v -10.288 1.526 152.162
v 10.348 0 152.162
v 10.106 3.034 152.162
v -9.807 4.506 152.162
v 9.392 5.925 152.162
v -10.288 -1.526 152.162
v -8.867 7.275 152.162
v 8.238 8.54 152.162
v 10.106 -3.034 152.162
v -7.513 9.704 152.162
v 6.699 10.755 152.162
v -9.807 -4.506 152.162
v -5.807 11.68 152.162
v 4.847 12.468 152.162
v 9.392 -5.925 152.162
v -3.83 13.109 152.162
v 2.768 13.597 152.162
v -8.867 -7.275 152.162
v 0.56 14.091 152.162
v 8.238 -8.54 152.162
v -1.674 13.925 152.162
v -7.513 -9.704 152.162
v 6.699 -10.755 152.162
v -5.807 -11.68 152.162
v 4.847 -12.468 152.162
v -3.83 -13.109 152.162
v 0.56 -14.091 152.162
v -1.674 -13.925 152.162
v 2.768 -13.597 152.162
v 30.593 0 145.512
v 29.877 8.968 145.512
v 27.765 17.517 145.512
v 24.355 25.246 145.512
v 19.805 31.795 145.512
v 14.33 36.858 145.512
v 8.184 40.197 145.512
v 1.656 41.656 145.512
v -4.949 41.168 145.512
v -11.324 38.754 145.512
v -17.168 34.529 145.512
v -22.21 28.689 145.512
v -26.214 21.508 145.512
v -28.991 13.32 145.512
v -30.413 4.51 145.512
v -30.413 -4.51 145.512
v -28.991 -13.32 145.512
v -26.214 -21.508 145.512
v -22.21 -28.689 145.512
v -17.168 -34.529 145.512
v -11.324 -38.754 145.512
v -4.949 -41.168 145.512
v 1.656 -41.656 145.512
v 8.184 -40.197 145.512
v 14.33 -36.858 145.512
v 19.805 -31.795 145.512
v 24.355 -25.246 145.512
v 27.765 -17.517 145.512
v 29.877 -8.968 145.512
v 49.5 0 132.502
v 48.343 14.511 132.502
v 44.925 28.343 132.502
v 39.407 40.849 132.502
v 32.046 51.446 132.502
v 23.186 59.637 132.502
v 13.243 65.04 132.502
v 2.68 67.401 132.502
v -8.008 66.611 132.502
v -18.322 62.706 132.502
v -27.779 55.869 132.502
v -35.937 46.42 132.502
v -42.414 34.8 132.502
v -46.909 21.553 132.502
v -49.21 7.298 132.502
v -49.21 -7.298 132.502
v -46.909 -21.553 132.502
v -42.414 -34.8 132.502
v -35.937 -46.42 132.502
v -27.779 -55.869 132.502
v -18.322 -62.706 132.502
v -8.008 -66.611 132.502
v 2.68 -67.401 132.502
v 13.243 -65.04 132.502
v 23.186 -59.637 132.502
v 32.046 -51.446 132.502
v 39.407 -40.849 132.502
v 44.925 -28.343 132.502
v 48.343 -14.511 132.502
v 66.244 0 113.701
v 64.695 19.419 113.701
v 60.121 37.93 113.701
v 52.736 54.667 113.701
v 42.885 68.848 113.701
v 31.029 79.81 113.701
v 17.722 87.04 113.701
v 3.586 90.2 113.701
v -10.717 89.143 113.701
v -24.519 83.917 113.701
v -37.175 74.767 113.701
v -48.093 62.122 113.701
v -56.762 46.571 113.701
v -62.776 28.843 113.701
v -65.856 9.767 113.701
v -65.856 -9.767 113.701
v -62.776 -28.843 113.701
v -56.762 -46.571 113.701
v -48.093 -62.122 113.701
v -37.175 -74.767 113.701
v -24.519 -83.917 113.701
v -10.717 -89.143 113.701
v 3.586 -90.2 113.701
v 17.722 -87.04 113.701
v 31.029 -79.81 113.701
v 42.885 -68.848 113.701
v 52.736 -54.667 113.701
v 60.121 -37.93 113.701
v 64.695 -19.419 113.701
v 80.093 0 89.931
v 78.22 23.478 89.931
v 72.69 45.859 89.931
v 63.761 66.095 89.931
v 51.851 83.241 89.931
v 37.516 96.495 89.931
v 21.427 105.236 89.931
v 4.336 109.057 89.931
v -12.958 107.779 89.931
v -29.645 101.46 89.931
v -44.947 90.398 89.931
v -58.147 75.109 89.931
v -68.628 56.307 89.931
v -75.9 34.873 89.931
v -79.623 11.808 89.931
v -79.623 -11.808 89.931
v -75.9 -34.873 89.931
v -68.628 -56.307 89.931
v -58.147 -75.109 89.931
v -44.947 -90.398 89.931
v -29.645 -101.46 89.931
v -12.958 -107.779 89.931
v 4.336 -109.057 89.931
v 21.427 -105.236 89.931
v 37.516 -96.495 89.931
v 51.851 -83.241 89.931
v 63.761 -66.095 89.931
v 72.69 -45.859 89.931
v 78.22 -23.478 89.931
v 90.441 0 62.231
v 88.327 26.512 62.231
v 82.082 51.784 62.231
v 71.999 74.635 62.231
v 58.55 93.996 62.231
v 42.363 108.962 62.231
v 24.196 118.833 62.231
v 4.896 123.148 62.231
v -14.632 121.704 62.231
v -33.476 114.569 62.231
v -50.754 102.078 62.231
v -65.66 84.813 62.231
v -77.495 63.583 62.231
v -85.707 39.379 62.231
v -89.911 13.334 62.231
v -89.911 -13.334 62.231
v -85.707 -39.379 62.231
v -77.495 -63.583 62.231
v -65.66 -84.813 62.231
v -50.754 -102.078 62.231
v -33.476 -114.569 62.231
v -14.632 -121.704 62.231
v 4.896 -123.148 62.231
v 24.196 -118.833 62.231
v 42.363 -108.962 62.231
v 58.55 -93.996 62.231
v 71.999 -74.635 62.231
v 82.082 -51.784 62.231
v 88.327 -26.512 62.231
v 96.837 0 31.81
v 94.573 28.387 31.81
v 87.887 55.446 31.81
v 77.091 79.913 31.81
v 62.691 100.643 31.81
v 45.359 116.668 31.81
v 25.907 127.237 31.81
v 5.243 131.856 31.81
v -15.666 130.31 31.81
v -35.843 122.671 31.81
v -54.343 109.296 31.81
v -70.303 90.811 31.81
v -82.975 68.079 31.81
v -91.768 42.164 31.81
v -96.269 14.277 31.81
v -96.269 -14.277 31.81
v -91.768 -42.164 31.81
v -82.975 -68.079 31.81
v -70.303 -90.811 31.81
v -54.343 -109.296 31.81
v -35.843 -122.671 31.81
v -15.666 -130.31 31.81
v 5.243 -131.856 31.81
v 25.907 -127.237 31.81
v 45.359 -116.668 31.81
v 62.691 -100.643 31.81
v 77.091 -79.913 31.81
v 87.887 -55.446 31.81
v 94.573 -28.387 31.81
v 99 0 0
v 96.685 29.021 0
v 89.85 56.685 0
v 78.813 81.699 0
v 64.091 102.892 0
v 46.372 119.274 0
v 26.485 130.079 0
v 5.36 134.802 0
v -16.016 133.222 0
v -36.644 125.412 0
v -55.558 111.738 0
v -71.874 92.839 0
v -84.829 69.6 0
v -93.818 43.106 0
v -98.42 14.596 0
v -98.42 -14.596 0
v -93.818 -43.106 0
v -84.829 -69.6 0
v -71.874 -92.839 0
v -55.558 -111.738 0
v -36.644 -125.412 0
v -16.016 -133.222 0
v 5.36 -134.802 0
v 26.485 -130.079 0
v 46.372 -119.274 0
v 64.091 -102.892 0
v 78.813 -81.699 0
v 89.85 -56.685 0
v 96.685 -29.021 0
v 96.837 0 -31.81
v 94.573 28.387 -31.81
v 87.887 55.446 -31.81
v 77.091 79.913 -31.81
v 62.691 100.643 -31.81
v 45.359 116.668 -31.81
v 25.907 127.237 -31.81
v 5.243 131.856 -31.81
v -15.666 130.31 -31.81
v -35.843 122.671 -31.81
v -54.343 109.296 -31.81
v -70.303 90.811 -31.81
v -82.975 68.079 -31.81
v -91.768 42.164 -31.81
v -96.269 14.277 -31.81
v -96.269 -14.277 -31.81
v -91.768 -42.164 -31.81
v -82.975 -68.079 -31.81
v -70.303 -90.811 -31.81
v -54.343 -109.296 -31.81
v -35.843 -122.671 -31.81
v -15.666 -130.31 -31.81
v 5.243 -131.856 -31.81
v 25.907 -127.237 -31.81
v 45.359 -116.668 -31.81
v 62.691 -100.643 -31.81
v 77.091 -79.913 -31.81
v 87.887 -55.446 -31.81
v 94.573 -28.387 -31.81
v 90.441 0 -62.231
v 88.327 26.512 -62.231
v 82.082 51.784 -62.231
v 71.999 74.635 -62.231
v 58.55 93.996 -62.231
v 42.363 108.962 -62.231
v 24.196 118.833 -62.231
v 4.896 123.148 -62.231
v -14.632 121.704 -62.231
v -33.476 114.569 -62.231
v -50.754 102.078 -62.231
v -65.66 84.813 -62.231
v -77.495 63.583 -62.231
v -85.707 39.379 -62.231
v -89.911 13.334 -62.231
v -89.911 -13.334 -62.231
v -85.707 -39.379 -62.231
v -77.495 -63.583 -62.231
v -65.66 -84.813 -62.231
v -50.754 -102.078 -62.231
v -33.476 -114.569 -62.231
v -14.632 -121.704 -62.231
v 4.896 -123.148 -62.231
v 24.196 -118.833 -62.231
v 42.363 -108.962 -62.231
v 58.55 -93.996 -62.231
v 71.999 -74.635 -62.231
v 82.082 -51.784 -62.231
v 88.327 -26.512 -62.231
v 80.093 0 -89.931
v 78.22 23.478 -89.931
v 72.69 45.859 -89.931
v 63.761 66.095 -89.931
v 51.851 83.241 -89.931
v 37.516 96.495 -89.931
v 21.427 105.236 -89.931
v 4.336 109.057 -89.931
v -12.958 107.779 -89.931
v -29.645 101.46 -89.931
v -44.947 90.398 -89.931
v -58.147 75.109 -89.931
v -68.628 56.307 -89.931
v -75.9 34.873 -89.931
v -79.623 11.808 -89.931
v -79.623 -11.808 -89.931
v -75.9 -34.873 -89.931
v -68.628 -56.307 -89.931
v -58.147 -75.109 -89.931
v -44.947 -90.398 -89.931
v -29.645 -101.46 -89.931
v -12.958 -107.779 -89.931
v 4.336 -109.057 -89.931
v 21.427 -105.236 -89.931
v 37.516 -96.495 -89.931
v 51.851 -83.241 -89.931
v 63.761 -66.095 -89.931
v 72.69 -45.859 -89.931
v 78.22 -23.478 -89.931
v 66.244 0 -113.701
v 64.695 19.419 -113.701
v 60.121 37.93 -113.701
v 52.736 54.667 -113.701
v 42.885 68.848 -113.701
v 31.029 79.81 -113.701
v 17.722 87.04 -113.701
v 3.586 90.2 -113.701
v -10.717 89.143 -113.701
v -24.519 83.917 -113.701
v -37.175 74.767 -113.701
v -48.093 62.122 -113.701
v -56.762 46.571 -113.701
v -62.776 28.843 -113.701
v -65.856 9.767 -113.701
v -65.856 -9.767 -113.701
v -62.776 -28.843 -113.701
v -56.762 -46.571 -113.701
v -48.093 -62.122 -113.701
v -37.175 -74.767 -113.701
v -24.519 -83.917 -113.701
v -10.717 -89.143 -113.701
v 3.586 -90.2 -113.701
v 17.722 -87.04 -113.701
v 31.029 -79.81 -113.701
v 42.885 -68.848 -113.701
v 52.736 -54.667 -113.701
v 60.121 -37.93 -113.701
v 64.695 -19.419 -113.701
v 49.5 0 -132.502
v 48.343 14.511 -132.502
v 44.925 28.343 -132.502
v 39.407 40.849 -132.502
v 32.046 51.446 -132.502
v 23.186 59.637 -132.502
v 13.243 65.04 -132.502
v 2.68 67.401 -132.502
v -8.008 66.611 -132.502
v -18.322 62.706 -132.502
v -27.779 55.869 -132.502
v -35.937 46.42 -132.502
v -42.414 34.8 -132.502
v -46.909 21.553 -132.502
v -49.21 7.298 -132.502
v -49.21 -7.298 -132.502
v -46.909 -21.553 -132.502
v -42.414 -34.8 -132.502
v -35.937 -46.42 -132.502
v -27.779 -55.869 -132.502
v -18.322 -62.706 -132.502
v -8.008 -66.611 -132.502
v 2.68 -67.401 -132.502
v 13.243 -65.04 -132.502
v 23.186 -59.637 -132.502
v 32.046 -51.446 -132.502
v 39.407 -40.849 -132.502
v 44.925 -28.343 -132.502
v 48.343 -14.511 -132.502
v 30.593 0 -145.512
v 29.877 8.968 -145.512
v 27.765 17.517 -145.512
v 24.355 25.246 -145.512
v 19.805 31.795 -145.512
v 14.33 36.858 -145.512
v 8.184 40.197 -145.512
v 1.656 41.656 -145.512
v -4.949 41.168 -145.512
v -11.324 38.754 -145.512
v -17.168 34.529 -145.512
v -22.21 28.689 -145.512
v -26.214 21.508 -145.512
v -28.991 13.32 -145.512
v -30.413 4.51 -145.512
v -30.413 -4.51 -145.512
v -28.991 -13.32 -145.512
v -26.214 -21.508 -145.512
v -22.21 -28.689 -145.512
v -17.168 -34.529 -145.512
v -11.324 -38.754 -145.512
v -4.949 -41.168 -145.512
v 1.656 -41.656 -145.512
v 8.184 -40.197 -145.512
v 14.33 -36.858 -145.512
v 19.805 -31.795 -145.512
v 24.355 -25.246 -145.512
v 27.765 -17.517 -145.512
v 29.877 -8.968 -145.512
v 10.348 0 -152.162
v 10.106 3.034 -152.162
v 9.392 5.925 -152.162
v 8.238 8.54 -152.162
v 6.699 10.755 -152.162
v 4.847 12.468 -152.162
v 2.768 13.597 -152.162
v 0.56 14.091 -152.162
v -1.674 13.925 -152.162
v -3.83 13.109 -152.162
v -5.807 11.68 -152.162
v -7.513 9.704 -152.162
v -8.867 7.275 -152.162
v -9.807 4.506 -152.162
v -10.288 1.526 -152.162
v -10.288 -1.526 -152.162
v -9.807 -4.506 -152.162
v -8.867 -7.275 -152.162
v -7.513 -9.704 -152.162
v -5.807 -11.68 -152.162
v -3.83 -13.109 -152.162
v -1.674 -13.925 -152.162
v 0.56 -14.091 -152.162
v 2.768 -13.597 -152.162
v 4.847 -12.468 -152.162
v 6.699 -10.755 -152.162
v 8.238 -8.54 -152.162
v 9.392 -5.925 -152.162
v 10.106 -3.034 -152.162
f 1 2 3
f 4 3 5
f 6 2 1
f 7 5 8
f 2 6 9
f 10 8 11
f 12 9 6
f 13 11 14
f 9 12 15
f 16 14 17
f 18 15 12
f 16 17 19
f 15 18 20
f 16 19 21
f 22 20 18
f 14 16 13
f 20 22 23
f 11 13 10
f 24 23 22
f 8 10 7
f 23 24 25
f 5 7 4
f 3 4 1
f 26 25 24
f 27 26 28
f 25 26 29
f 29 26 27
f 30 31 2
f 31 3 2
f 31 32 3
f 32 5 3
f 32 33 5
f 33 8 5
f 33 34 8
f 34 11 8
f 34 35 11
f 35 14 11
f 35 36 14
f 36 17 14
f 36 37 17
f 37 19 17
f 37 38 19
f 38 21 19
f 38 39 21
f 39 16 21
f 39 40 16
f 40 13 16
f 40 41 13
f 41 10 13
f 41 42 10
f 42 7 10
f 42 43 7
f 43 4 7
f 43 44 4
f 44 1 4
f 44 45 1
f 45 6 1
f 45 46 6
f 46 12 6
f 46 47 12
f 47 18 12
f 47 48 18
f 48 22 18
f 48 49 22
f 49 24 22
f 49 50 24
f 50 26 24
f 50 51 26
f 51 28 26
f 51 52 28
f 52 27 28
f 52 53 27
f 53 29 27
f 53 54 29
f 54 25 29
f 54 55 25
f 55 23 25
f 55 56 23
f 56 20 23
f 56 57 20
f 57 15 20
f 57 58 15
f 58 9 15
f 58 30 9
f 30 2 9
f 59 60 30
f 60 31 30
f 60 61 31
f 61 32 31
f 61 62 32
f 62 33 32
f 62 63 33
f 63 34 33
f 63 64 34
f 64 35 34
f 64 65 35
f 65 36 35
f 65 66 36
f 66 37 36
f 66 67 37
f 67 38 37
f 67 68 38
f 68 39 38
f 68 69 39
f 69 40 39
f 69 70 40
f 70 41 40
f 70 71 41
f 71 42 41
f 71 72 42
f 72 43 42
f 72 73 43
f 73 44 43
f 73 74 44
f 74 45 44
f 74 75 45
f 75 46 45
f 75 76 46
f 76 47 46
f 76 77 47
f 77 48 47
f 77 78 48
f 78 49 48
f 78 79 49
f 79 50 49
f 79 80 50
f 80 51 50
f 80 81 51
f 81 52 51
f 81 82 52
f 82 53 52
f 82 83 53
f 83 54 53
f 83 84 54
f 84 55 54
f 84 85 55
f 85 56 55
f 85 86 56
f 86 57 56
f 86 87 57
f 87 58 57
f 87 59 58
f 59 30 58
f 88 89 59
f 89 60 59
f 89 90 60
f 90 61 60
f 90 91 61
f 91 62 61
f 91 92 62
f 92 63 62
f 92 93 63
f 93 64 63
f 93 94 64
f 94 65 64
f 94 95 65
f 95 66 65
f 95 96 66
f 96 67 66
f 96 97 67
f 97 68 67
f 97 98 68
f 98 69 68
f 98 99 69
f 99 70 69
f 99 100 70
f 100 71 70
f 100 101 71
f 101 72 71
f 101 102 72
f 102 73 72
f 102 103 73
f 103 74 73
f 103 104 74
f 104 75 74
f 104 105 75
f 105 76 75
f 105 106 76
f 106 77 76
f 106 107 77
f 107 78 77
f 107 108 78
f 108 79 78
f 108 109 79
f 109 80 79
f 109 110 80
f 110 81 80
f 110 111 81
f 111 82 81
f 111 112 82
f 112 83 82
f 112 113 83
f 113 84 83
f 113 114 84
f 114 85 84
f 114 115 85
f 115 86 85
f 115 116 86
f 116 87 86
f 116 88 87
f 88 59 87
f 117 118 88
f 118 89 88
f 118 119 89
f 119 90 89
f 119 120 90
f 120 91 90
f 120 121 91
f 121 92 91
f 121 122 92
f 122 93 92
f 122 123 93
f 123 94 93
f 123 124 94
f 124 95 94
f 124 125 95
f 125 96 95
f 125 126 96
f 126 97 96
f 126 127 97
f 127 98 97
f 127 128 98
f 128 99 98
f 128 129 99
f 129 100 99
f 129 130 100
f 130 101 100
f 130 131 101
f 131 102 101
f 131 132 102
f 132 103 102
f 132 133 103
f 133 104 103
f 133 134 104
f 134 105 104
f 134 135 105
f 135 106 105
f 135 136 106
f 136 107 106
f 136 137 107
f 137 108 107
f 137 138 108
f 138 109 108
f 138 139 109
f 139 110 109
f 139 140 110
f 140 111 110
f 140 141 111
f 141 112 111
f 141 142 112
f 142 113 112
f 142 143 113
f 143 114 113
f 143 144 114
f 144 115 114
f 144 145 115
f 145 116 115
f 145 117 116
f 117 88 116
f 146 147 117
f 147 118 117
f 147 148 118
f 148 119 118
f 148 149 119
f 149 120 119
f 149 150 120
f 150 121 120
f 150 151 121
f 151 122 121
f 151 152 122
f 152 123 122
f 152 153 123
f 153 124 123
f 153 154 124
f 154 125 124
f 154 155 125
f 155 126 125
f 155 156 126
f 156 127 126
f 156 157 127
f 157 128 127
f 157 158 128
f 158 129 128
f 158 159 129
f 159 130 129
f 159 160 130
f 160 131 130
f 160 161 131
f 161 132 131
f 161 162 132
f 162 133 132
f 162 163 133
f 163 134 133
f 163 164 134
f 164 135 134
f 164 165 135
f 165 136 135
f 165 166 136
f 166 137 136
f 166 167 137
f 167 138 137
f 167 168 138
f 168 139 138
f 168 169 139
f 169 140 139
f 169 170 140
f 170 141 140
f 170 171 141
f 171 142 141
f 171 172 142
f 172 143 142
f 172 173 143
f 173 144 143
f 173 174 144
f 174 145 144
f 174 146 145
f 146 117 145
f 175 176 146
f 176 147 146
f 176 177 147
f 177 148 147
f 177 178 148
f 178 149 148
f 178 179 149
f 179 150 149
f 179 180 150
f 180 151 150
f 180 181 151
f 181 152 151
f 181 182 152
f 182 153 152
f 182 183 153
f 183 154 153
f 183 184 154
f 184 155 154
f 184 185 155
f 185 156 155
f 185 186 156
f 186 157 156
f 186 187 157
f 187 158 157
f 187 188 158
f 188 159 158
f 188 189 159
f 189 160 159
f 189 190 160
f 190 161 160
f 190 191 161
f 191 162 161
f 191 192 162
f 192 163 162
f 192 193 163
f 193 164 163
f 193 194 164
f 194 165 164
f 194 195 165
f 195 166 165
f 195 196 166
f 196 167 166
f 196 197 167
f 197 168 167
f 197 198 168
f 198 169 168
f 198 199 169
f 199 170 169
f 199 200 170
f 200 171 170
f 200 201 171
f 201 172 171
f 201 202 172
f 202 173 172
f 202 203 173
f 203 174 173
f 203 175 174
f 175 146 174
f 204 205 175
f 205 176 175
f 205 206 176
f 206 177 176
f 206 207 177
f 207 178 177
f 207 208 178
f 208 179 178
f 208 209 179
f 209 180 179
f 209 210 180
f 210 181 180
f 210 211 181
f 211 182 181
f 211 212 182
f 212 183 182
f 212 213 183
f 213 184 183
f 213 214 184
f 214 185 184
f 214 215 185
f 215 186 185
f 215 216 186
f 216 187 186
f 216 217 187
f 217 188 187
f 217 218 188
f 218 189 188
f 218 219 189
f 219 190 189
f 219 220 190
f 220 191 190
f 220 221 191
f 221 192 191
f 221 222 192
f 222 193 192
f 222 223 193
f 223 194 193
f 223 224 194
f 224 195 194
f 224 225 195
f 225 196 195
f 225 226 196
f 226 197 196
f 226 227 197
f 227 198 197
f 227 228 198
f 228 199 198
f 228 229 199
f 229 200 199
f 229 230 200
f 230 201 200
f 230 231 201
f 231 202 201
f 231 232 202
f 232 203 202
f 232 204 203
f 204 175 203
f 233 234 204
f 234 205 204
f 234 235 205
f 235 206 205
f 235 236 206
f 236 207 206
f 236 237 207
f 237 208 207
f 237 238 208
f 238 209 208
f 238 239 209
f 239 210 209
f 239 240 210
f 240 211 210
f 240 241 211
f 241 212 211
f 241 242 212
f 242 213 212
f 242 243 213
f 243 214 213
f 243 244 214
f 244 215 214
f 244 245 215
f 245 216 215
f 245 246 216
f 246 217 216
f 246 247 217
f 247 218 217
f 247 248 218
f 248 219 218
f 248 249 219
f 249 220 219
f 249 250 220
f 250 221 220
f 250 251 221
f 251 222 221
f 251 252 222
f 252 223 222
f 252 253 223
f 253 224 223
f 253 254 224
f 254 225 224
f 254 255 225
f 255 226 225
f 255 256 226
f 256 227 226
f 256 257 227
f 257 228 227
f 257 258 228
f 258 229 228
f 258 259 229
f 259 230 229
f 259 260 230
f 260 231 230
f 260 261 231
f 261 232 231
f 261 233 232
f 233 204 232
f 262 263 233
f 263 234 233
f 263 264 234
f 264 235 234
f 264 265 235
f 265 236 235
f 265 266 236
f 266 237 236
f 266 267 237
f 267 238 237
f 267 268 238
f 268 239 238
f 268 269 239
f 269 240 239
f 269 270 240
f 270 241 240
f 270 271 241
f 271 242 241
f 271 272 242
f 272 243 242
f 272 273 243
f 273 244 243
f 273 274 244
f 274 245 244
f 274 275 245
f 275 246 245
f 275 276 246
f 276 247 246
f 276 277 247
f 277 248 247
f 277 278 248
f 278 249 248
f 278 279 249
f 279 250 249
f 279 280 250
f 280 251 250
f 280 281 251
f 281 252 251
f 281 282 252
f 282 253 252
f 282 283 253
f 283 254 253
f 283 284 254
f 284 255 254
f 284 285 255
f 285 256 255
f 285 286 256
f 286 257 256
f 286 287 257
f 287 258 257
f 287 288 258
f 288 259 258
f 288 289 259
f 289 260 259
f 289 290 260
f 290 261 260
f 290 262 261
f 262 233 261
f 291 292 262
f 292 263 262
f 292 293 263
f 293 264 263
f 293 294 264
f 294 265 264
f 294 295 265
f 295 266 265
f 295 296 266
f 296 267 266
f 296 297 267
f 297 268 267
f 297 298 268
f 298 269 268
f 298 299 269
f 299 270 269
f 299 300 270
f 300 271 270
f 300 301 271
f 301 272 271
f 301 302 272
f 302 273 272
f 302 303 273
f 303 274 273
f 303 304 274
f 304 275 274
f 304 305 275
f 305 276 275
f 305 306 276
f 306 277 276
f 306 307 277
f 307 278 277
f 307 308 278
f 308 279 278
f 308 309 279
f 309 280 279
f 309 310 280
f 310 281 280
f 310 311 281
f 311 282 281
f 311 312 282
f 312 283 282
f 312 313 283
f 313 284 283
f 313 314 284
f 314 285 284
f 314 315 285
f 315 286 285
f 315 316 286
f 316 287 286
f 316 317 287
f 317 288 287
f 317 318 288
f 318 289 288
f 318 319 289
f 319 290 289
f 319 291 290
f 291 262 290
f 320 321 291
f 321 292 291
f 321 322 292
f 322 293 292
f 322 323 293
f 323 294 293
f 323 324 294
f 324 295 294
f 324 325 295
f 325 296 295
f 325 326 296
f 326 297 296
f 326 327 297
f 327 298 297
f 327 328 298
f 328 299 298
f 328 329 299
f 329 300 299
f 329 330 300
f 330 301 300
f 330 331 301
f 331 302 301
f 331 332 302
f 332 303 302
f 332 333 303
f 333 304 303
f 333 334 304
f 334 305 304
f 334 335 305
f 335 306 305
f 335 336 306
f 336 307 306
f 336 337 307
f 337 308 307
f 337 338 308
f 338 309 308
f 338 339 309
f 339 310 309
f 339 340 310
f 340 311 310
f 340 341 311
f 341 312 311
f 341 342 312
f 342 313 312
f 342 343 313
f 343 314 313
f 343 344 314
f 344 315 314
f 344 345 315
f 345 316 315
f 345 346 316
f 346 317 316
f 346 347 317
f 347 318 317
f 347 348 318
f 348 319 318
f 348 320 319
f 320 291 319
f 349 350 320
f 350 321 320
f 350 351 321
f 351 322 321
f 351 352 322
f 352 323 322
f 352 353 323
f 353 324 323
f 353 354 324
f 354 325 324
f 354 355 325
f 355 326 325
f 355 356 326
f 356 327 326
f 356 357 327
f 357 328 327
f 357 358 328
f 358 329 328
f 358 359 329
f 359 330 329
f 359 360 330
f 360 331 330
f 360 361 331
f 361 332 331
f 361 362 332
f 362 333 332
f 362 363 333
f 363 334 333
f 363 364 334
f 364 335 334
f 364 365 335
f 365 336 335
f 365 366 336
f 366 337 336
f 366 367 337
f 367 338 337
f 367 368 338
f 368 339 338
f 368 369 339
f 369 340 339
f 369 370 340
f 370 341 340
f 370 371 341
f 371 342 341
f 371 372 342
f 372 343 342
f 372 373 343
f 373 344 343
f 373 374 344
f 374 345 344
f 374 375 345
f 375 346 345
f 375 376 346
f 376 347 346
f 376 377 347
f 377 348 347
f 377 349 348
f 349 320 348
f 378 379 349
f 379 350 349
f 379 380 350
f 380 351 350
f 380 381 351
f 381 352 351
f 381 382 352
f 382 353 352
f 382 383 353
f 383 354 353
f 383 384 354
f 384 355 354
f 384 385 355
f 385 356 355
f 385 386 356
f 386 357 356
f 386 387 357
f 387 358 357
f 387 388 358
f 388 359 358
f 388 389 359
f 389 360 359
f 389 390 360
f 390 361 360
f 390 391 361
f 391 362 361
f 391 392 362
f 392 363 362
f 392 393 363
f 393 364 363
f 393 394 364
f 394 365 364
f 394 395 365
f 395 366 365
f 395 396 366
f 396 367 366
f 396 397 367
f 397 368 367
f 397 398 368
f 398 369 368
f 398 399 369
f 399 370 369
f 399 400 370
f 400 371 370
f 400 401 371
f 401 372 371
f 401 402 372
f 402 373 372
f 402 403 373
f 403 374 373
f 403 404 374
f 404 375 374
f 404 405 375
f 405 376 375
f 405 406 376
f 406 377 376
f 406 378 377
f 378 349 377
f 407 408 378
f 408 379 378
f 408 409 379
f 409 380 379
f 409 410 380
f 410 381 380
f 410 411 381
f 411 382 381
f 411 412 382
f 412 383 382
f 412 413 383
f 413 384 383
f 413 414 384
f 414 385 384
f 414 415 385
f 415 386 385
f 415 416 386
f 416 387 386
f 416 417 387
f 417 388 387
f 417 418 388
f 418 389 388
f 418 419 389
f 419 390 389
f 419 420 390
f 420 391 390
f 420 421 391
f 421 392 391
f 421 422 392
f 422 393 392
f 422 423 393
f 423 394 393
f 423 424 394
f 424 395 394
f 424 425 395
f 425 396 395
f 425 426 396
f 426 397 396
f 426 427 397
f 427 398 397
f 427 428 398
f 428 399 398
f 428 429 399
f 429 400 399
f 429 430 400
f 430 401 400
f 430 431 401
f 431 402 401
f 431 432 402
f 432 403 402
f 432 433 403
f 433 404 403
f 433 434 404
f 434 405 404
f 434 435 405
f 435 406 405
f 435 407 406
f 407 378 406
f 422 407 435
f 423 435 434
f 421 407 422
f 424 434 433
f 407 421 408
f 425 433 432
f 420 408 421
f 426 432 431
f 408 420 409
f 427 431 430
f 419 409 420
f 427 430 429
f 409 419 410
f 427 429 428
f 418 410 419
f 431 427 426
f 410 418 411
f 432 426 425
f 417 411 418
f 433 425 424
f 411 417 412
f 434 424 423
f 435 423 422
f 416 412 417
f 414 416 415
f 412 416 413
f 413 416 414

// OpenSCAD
// Generated by SolidPython 1.0.1 on 2020-07-29 00:46:50


scale(v = [11, 15, 17]) {
	sphere(r = 9);
}
/***********************************************
*********      SolidPython code:      **********
************************************************
 
# import packages: SolidPython
from solid import *
from solid.utils import *
from itertools import chain, combinations, permutations


class Resize:

    def __init__(self, scad_file):
        self.scad_file = scad_file
        #self.scad_file = import_scad(scad_file)
        # cone/cylinder param:
        self.r1 = 0
        self.r2 = 0
        self.h = 0
        # rectangular prism param:
        self.w = 0
        self.l = 0
        # ellipse param:
        self.r = 0

    # import OpenScad code (file name corresponds to shape)


    # classify shape + parameters
    def assign(self, param1, param2, param3):
        if self.scad_file == 'cone.scad':
            self.r1 = param1
            self.r2 = param2
            self.h = param3
        elif self.scad_file == 'cylinder.scad':
            self.r1 = param1
            self.r2 = param2
            self.h = param3
        elif self.scad_file == 'rectangularPrism.scad':
            self.h = param1
            self.l = param2
            self.w = param3
        else:
            self.r = param1
            self.h = param2

    # resize parameters
    def iterate(self):
        x = range(3, 20, 2)
        i = 1
        if self.scad_file == 'cone.scad':
            tempList = list(permutations(x, 2))
            for temp in tempList:
                param1 = temp[0]
                param2 = temp[1]
                filepath = 'produced_scad_files/' + 'cone' + str(param1) + '_' + str(param2) + '_' + '.scad'
                scad_render_to_file(cylinder(h=param1, r1=param2, r2=0), filepath)

        elif self.scad_file == 'cylinder.scad':
            tempList = list(permutations(x, 3))
            for temp in tempList:
                param1 = temp[0]
                param2 = temp[1]
                filepath = 'produced_scad_files/' + 'cylinder' + str(param1) + '_' + str(param2) + '_' + '.scad'
                scad_render_to_file(cylinder(h=param1, r1=param2, r2=param2), filepath)

        elif self.scad_file == 'rectangularPrism.scad':
            tempList = list(permutations(x, 3))
            for temp in tempList:
                param1 = temp[0]
                param2 = temp[1]
                param3 = temp[2]
                filepath = 'produced_scad_files/' + 'rectangularPrism' + str(param1) + '_' + str(param2) + '_' + str(
                    param3) + '.scad'
                scad_render_to_file(cube(size=(param1, param2, param3)), filepath)

        elif self.scad_file == 'ellipse.scad':
            tempList = list(permutations(x, 4))
            for temp in tempList:
                param1 = temp[0]
                param2 = temp[1]
                param3 = temp[2]
                param4 = temp[3]
                filepath = 'produced_scad_files/' + 'ellipse' + str(param1) + '_' + str(param2) + '_' + str(param3) + '_' + str(param4) + '.scad'
                scad_render_to_file(scale([param1, param2, param3])(sphere(r=param4)), filepath)

    def render_to_scadfile(self):
        scad_render_to_file(scad, 'example.scad') 
 
************************************************/
